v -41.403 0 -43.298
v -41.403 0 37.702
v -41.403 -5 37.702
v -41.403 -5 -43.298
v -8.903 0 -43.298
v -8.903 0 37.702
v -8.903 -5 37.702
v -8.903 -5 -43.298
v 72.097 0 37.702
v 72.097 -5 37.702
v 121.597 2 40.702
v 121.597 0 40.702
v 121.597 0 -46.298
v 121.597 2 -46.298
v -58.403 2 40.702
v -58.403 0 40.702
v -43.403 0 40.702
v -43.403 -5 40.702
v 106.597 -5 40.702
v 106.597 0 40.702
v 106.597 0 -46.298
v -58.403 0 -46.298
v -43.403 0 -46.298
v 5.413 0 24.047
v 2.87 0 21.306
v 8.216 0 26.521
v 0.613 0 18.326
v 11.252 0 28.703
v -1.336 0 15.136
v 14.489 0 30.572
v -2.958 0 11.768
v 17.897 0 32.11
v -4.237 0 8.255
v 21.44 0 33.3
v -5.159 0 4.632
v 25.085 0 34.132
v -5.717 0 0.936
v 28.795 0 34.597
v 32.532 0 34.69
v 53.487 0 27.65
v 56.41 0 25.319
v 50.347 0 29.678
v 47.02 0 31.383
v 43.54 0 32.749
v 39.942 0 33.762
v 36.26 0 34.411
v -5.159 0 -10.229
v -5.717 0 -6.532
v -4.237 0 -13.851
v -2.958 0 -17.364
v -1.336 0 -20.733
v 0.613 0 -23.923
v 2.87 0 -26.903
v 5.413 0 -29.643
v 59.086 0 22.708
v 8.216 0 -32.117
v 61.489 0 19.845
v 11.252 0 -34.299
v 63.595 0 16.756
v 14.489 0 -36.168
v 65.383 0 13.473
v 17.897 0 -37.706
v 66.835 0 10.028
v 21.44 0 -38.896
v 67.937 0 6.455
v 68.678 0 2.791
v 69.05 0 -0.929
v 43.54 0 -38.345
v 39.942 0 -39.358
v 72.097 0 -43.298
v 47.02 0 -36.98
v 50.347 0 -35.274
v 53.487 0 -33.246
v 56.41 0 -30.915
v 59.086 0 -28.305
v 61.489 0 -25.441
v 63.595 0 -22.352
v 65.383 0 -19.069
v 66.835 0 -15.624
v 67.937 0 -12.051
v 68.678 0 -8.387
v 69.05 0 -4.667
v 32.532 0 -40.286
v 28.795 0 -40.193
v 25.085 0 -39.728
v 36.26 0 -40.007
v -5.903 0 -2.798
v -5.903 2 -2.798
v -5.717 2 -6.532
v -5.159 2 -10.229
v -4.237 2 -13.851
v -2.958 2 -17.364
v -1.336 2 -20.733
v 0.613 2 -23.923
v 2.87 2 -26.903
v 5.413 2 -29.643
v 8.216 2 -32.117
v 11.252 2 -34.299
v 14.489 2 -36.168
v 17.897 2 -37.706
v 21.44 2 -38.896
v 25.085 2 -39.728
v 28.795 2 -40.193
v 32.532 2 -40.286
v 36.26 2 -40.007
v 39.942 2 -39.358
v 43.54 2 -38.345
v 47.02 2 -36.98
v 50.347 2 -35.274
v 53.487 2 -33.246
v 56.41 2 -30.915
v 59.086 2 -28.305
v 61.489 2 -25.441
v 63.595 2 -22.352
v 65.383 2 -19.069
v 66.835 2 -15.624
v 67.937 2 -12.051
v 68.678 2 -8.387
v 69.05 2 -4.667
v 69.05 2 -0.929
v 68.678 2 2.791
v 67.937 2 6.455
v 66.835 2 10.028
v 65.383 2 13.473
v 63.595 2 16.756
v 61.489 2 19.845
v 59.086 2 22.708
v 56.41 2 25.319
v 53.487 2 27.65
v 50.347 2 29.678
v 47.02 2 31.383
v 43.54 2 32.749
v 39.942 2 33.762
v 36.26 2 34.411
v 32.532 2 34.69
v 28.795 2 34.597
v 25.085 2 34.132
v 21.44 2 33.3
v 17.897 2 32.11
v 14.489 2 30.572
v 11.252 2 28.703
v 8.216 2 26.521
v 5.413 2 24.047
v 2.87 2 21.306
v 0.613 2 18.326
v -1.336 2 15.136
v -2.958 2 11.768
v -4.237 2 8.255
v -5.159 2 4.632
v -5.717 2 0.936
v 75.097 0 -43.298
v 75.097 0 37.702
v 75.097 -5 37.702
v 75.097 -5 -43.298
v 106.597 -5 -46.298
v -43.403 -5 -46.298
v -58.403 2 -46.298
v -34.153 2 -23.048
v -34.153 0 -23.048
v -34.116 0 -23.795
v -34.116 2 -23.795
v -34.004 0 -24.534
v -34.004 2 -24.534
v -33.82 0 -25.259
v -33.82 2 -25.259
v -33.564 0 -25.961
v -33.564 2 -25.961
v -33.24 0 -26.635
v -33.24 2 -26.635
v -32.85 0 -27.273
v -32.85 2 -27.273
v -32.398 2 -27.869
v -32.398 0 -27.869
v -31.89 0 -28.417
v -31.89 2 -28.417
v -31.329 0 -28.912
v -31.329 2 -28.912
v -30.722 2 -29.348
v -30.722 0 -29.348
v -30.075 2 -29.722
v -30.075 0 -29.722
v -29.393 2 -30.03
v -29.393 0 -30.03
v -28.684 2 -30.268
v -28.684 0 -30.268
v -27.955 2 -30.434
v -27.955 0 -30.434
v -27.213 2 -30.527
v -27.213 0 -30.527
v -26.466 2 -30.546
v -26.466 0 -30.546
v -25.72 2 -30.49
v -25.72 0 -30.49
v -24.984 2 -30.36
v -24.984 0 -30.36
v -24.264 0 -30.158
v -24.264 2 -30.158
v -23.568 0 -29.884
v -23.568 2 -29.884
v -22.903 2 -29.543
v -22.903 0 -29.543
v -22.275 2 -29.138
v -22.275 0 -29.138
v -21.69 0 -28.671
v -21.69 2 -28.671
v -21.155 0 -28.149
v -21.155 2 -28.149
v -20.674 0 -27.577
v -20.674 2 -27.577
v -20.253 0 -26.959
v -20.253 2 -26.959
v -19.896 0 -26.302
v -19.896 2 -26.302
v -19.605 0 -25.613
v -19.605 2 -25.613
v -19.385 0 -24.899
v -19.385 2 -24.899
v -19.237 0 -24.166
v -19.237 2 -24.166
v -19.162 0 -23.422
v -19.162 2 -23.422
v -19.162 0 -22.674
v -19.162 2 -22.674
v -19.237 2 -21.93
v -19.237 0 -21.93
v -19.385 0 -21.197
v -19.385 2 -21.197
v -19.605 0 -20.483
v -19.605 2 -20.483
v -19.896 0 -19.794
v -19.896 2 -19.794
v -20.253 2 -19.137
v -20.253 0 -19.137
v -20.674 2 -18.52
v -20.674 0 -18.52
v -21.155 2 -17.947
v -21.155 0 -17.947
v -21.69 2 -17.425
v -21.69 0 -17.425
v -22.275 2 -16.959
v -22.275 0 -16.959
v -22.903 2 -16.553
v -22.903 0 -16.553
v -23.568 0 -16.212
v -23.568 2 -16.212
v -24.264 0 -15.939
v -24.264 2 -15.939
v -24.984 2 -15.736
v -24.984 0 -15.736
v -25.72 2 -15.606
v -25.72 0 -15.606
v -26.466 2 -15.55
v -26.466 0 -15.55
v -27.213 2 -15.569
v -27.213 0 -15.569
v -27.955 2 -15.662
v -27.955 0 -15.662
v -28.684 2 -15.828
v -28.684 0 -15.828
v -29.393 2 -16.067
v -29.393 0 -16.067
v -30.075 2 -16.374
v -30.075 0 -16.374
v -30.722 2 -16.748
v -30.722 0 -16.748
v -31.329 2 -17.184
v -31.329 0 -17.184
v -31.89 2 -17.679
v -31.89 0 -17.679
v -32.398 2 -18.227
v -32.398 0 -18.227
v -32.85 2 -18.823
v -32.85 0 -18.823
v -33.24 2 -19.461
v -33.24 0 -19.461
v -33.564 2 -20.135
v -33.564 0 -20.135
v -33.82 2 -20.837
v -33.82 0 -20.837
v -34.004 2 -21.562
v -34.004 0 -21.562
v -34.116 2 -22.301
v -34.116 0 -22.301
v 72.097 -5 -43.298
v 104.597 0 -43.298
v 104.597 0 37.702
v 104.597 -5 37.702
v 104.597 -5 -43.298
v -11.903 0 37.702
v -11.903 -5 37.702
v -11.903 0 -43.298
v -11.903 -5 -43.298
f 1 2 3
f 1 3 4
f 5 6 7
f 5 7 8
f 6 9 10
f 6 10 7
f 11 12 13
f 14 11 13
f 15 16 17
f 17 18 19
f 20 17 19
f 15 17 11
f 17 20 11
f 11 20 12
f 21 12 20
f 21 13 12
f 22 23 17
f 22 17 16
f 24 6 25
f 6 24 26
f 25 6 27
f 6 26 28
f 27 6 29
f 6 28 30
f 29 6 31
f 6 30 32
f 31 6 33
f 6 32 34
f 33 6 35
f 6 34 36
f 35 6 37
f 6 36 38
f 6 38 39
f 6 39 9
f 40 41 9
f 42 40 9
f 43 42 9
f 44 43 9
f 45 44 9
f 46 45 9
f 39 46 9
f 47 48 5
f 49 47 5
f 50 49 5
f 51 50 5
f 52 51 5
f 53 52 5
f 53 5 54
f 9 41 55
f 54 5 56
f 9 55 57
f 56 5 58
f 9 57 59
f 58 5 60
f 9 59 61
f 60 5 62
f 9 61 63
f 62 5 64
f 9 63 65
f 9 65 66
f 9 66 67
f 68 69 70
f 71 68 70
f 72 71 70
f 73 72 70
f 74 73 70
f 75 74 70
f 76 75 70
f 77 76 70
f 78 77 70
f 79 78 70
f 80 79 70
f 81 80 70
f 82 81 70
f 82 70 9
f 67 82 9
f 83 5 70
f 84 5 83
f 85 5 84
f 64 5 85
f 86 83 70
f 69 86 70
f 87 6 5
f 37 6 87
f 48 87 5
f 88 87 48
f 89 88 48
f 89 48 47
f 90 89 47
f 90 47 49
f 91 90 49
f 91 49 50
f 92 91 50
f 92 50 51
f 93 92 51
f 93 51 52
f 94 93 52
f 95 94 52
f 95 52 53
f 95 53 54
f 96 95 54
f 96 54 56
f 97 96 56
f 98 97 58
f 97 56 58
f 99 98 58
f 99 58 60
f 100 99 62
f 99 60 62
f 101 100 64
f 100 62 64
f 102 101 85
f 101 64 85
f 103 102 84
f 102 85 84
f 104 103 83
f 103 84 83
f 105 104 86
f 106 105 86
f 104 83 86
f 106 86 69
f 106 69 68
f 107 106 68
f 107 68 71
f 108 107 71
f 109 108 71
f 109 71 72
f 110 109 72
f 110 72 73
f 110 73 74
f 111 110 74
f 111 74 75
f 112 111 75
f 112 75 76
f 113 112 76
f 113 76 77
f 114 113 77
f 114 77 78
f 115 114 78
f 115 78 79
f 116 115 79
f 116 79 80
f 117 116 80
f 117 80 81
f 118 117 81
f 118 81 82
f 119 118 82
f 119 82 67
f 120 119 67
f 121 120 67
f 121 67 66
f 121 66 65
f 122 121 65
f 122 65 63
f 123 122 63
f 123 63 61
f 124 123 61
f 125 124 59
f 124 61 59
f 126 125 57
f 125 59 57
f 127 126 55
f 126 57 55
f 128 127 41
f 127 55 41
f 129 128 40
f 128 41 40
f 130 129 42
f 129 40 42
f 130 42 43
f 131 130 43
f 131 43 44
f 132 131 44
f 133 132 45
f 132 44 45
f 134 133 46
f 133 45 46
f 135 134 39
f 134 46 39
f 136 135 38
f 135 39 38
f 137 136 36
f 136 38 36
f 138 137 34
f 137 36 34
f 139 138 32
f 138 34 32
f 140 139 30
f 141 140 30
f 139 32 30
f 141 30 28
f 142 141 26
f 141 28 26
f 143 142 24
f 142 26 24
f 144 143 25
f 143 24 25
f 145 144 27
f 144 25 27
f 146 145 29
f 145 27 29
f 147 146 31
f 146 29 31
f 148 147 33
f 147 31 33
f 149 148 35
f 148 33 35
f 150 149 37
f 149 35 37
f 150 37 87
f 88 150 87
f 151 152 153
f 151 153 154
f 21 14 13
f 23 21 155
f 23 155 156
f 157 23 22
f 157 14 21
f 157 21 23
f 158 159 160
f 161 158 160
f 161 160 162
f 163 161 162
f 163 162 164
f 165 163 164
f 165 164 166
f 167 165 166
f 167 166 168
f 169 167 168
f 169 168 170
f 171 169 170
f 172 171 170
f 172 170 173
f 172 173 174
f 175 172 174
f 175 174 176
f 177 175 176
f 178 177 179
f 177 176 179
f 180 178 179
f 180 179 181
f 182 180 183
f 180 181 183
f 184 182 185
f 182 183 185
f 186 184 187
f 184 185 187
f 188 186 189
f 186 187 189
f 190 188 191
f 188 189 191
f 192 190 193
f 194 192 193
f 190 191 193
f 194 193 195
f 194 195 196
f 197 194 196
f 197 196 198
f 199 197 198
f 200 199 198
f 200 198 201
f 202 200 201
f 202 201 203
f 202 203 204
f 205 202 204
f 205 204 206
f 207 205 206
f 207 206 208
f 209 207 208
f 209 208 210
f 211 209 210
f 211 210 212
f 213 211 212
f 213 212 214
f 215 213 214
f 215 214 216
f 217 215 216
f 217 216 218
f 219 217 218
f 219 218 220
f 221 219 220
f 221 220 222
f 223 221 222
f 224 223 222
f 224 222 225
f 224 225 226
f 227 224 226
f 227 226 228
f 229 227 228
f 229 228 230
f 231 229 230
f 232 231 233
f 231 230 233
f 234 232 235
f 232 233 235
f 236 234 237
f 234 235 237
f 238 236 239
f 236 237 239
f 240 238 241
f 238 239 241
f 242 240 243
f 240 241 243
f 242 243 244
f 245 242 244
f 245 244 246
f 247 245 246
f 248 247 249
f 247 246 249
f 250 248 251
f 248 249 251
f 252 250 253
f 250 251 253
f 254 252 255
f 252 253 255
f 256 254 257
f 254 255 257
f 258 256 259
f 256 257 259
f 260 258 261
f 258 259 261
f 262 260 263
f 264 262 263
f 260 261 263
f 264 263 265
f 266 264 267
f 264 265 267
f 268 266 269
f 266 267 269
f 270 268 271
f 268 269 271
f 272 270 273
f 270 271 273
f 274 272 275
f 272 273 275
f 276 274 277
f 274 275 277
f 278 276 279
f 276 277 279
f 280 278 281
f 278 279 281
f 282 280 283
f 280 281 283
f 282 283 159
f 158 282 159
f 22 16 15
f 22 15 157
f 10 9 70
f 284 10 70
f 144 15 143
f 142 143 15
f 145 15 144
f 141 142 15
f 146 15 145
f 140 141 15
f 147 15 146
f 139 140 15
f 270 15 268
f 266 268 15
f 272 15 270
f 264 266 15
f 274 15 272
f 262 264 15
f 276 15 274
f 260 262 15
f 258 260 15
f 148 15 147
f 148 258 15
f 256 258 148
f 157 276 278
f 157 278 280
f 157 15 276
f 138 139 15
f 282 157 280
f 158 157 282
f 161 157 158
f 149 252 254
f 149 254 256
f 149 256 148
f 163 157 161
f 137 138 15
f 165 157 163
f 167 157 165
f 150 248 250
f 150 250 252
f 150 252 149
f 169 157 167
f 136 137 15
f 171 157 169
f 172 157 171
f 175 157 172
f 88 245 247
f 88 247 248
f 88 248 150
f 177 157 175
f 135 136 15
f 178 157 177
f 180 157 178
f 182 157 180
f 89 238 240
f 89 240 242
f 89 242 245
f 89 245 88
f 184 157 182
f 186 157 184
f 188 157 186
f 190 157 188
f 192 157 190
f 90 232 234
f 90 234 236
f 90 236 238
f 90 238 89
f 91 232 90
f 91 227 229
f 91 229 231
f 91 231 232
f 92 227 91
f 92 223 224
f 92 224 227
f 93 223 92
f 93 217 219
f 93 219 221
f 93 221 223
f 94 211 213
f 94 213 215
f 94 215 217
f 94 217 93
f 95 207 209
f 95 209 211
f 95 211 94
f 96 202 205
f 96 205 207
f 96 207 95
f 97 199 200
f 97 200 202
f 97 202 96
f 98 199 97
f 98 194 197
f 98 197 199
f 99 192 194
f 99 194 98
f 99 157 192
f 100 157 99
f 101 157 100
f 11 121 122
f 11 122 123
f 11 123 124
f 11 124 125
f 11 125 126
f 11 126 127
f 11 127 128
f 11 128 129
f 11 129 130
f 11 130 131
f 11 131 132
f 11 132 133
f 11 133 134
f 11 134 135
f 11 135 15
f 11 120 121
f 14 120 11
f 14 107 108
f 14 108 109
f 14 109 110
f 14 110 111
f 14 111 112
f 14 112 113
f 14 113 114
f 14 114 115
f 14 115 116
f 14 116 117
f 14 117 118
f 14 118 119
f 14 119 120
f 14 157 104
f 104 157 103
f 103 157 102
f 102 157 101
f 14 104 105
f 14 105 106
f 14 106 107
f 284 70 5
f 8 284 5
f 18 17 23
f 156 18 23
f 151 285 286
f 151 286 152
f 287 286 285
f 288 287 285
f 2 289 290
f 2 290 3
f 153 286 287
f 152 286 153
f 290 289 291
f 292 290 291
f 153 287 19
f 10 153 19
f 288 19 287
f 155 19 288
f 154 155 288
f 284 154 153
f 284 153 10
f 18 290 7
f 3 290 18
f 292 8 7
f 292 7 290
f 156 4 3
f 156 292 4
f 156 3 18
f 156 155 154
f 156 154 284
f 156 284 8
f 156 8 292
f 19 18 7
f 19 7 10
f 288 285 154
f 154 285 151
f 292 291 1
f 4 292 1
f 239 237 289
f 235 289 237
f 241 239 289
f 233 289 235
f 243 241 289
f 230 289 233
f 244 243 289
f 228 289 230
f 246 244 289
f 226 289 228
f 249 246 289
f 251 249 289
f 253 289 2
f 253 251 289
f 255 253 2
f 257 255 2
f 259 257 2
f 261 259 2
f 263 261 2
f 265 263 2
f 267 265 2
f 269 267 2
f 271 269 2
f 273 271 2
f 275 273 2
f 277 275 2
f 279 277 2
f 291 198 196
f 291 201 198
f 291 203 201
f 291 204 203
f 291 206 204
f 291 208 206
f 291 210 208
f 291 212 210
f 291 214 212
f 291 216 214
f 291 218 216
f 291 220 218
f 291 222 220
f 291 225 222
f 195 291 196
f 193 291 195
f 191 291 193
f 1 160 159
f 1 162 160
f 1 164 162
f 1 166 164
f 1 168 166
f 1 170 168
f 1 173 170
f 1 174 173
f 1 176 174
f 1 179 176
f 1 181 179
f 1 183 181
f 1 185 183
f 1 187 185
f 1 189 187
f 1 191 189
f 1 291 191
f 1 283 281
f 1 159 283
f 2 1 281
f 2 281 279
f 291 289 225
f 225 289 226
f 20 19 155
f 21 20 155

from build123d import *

# Parameters (mm, degrees)
SKETCH1_W           = 180
SKETCH1_H           = 87
BOSS_EXTRUDE1_DEPTH = 2
SKETCH6_W           = 2
SKETCH6_H           = 87
BOSS_EXTRUDE5_DEPTH = 5
SKETCH7_R           = 37.5
CUT_EXTRUDE2_DEPTH  = 5
SKETCH8_W           = 87
SKETCH8_H           = 87
SKETCH8_W_2         = 81
SKETCH8_H_2         = 81
BOSS_EXTRUDE6_DEPTH = 5
SKETCH9_W           = 150
SKETCH9_H           = 3
BOSS_EXTRUDE7_DEPTH = 5
SKETCH10_W          = 2
SKETCH10_H          = 87
CUT_EXTRUDE3_DEPTH  = 5
SKETCH11_W          = 2
SKETCH11_H          = 81
BOSS_EXTRUDE8_DEPTH = 5
SKETCH12_R          = 7.5
CUT_EXTRUDE4_DEPTH  = 5


with BuildPart() as part:
    # Sketch1 → Boss-Extrude1 (new body)
    with BuildSketch(Plane(origin=(0, 0, 0), x_dir=(1, 0, 0), z_dir=(0, 1, 0))):
        with Locations((31.597011279, 2.798063398)):
            Rectangle(SKETCH1_W, SKETCH1_H)
    extrude(amount=BOSS_EXTRUDE1_DEPTH)

    # Sketch6 → Boss-Extrude5 (add)
    with BuildSketch(Plane(origin=(0, 0, 0), x_dir=(-1, 0, 0), z_dir=(0, -1, 0))):
        with Locations((44.402988721, 2.798063398)):
            Rectangle(SKETCH6_W, SKETCH6_H)
        with Locations((-107.597011279, 2.798063398)):
            Rectangle(SKETCH6_W, SKETCH6_H)
    extrude(amount=BOSS_EXTRUDE5_DEPTH)

    # Sketch7 → Cut-Extrude2 (cut)
    with BuildSketch(Plane(origin=(0, 0, 0), x_dir=(-1, 0, 0), z_dir=(0, -1, 0))):
        with Locations((-31.597011279, 2.798063398)):
            Circle(SKETCH7_R)
    extrude(amount=-CUT_EXTRUDE2_DEPTH, mode=Mode.SUBTRACT)

    # Sketch8 → Boss-Extrude6 (add)
    with BuildSketch(Plane(origin=(0, 0, 0), x_dir=(-1, 0, 0), z_dir=(0, -1, 0))):
        with Locations((-31.597011279, 2.798063398)):
            Rectangle(SKETCH8_W, SKETCH8_H)
        with Locations((-31.597011279, 2.798063398)):
            Rectangle(SKETCH8_W_2, SKETCH8_H_2, mode=Mode.SUBTRACT)
    extrude(amount=BOSS_EXTRUDE6_DEPTH)

    # Sketch9 → Boss-Extrude7 (add)
    with BuildSketch(Plane(origin=(0, 0, 0), x_dir=(-1, 0, 0), z_dir=(0, -1, 0))):
        with Locations((-31.597011279, 44.798063398)):
            Rectangle(SKETCH9_W, SKETCH9_H)
        with Locations((-31.597011279, -39.201936602)):
            Rectangle(SKETCH9_W, SKETCH9_H)
    extrude(amount=BOSS_EXTRUDE7_DEPTH)

    # Sketch10 → Cut-Extrude3 (cut)
    with BuildSketch(Plane(origin=(0, -5, 0), x_dir=(-1, 0, 0), z_dir=(0, -1, 0))):
        with Locations((-107.597011279, 2.798063398)):
            Rectangle(SKETCH10_W, SKETCH10_H)
        with Locations((44.402988721, 2.798063398)):
            Rectangle(SKETCH10_W, SKETCH10_H)
    extrude(amount=-CUT_EXTRUDE3_DEPTH, mode=Mode.SUBTRACT)

    # Sketch11 → Boss-Extrude8 (add)
    with BuildSketch(Plane(origin=(0, 0, 0), x_dir=(-1, 0, 0), z_dir=(0, -1, 0))):
        with Locations((42.402988721, 2.798063398)):
            Rectangle(SKETCH11_W, SKETCH11_H)
        with Locations((-105.597011279, 2.798063398)):
            Rectangle(SKETCH11_W, SKETCH11_H)
    extrude(amount=BOSS_EXTRUDE8_DEPTH)

    # Sketch12 → Cut-Extrude4 (cut)
    with BuildSketch(Plane(origin=(0, 0, 0), x_dir=(-1, 0, 0), z_dir=(0, -1, 0))):
        with Locations((26.652988721, 23.048063398)):
            Circle(SKETCH12_R)
    extrude(amount=-CUT_EXTRUDE4_DEPTH, mode=Mode.SUBTRACT)


solid = part.part
